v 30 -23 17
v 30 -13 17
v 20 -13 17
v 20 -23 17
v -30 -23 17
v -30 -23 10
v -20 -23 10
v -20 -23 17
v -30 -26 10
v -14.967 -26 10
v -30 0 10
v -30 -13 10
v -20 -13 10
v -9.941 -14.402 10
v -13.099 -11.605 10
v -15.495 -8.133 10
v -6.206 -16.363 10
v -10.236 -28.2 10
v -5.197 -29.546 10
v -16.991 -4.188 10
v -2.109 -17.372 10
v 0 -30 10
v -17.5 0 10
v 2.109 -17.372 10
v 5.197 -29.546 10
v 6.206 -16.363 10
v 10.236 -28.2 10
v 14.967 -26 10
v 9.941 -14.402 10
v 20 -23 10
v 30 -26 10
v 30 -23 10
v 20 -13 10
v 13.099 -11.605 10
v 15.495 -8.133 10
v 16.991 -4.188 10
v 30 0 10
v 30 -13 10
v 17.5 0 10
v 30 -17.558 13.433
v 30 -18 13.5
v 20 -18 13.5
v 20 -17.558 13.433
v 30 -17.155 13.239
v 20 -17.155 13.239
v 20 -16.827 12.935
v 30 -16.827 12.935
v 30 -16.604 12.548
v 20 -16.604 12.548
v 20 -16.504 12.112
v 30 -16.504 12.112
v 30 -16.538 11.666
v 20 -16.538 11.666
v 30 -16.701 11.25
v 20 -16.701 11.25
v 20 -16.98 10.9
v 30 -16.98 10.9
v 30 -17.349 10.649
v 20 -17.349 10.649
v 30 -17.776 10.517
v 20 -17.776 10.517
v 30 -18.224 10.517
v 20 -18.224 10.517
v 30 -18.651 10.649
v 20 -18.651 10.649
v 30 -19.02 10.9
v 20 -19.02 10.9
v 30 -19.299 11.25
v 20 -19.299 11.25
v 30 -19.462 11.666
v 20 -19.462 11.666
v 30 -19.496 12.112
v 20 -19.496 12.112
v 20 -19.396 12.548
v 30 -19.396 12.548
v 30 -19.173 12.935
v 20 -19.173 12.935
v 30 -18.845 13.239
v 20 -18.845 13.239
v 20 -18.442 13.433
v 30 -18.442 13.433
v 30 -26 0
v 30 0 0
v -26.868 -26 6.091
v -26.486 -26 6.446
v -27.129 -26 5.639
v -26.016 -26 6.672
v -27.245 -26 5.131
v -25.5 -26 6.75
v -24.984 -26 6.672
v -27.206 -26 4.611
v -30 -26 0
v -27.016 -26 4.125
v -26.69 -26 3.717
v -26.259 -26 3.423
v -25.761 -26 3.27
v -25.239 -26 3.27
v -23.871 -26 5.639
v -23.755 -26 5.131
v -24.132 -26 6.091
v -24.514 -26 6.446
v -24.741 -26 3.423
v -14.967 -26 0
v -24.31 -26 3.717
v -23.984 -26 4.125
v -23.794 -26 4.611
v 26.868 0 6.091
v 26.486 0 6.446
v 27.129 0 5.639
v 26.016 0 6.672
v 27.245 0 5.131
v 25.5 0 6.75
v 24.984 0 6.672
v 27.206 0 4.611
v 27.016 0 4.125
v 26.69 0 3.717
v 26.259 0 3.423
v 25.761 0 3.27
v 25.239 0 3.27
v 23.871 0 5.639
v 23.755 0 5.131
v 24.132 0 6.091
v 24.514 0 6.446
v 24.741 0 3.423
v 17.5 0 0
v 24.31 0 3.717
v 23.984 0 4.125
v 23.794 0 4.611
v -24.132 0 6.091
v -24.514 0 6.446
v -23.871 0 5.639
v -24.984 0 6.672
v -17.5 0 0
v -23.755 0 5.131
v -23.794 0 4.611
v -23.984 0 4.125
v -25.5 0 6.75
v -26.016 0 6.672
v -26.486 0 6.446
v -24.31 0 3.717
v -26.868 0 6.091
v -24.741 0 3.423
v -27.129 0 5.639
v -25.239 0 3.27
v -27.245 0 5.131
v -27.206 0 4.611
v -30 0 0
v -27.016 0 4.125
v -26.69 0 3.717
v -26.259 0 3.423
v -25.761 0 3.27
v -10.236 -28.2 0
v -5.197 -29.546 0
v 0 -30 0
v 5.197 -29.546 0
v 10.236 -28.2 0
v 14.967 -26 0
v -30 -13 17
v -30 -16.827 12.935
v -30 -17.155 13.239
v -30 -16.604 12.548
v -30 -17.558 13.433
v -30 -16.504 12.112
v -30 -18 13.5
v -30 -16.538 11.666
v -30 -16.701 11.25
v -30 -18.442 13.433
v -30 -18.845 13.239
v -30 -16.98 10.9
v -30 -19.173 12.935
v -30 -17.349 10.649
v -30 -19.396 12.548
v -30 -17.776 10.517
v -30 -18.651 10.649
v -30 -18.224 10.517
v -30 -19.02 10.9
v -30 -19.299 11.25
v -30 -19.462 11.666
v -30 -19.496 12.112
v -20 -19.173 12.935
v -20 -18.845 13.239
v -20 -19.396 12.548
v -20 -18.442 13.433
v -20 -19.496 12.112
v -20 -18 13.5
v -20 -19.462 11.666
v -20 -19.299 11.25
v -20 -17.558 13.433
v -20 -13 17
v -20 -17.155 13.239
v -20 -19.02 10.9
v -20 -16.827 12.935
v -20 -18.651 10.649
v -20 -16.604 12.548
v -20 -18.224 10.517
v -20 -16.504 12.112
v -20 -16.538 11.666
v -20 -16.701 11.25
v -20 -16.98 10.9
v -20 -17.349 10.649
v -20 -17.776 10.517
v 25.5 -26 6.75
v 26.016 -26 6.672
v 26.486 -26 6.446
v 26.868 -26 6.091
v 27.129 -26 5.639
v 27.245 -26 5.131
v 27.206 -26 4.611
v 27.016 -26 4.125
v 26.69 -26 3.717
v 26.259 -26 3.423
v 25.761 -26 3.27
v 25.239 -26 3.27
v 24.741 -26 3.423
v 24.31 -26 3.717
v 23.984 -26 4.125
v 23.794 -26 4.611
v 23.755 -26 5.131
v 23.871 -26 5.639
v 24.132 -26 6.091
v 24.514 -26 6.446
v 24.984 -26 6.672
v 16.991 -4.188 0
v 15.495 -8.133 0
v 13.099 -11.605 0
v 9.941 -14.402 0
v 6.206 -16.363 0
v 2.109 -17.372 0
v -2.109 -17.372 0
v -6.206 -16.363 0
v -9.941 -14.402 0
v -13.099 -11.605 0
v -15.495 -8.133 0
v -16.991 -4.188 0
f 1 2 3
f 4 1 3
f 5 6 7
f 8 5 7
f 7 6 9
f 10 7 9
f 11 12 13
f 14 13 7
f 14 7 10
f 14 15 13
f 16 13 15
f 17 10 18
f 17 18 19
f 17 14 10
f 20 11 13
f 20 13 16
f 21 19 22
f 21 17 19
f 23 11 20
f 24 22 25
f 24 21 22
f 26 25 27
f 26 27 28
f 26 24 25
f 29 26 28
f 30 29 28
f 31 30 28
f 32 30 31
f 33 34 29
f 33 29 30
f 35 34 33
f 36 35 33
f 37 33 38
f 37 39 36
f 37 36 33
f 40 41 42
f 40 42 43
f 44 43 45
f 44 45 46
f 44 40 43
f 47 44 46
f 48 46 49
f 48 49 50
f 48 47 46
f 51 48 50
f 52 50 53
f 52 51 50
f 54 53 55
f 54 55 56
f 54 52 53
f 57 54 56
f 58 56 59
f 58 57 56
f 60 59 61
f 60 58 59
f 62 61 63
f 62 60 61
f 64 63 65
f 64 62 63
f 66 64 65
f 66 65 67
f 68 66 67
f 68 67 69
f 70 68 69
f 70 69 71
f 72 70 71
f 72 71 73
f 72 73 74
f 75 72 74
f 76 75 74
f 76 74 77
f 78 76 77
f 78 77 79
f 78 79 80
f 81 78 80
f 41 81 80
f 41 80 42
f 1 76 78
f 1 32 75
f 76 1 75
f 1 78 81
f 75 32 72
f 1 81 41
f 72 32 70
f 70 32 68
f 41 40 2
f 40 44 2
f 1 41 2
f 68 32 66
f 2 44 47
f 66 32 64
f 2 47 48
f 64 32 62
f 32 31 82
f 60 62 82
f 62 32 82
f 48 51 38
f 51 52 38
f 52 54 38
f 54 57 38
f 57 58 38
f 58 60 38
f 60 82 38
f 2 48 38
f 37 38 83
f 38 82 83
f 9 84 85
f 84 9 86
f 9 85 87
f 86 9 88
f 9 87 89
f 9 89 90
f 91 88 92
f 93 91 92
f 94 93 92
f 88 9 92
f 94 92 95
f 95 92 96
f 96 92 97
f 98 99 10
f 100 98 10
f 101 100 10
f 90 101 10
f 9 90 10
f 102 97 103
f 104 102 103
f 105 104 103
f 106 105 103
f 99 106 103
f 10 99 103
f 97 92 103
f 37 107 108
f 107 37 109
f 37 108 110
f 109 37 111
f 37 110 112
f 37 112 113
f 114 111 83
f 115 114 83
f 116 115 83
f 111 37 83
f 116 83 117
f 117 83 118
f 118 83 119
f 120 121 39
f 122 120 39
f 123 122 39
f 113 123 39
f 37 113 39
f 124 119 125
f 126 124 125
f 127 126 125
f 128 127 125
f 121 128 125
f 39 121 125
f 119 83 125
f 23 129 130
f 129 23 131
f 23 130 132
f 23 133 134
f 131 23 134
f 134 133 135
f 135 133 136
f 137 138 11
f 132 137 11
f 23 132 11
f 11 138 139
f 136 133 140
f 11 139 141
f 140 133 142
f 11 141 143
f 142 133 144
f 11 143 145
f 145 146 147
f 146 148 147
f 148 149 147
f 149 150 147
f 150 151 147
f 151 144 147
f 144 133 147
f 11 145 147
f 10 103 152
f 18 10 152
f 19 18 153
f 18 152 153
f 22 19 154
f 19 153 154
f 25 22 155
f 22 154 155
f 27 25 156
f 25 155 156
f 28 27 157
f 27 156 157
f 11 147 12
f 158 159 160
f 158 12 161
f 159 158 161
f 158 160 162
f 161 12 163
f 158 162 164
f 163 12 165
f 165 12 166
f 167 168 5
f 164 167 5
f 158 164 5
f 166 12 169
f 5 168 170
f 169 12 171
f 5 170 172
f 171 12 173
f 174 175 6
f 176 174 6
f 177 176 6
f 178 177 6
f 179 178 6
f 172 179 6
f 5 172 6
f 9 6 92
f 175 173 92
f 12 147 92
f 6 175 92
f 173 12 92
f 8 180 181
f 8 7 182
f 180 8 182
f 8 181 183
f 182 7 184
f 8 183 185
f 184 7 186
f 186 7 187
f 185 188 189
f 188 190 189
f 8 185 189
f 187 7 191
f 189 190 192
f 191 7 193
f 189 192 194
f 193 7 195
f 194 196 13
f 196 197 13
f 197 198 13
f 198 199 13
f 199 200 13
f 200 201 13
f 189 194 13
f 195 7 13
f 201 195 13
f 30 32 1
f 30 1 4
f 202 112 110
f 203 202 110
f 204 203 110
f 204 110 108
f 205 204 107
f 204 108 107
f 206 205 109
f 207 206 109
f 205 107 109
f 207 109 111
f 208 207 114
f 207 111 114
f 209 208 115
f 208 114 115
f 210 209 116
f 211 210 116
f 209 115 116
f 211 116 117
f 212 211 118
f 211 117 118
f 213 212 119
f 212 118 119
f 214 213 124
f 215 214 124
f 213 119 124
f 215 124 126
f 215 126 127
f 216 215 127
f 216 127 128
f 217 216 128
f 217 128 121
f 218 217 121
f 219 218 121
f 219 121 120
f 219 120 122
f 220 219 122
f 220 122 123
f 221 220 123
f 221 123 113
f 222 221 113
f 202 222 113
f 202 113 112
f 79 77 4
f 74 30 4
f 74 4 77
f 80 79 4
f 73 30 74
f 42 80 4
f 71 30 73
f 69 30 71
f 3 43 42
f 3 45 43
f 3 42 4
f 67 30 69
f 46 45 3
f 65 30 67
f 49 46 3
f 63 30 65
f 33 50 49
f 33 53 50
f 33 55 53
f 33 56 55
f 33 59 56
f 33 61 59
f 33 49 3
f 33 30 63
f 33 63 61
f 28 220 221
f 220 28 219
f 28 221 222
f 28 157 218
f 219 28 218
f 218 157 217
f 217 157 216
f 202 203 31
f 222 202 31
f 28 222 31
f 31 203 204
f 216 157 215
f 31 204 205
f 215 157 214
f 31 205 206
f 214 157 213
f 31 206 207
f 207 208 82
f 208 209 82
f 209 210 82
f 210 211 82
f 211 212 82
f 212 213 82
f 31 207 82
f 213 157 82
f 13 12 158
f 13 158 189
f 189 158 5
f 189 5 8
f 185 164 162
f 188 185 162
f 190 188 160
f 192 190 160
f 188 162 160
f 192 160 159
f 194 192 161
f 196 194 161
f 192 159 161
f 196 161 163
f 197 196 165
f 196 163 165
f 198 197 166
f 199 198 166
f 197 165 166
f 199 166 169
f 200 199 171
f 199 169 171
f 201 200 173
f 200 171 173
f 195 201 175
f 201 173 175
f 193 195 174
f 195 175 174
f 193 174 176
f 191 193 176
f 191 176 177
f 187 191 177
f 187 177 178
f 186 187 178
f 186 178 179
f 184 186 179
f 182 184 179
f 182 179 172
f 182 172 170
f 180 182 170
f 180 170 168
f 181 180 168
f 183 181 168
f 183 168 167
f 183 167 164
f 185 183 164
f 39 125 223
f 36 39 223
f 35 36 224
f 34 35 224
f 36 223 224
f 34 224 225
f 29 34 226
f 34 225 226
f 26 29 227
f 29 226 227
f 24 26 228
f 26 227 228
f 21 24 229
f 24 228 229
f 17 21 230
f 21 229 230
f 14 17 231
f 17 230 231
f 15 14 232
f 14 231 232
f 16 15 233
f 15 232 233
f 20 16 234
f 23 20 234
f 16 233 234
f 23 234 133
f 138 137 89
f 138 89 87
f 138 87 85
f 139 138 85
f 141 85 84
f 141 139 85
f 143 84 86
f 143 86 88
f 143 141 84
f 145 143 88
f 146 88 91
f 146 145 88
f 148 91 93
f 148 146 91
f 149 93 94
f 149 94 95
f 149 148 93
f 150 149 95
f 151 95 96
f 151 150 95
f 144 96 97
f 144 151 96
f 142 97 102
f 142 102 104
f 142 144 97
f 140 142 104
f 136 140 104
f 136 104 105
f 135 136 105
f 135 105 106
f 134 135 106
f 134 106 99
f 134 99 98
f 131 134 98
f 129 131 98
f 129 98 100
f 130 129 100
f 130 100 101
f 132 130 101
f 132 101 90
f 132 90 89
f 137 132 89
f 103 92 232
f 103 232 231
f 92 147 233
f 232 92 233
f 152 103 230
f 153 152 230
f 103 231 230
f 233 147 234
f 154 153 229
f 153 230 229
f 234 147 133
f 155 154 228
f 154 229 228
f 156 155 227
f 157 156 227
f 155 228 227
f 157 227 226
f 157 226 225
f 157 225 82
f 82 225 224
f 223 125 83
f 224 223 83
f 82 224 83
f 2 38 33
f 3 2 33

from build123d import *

# Parameters (mm, degrees)
Y_KSEKLIK_EKSTR_ZYON1_DEPTH = 10
KES_EKSTR_ZYON3_REACH       = 45.589
IZIM7_R                     = 1.75
SKETCH1_W                   = 10
SKETCH1_H                   = 10
BOSS_EXTRUDE1_DEPTH         = 7
CUT_EXTRUDE1_REACH          = 71.203
SKETCH2_R                   = 1.5


with BuildPart() as part:
    # Çizim2 → Yükseklik-Ekstrüzyon1 (new body)
    with BuildSketch(Plane.XY):
        with BuildLine():
            Line((14.966629547, -26), (30, -26))
            Line((30, -26), (30, 0))
            Line((30, 0), (17.5, 0))
            ThreePointArc((17.5, 0), (0, -17.5), (-17.5, 0))
            Line((-17.5, 0), (-30, 0))
            Line((-30, 0), (-30, -26))
            Line((-30, -26), (-14.966629547, -26))
            ThreePointArc((-14.966629547, -26), (0, -30), (14.966629547, -26))
        make_face()
    extrude(amount=Y_KSEKLIK_EKSTR_ZYON1_DEPTH)

    # Çizim7 → Kes-Ekstrüzyon3 (cut, up to next)
    with BuildSketch(Plane(origin=(0, 0, 0), x_dir=(1, 0, 0), z_dir=(0, 1, 0)), mode=Mode.PRIVATE) as kes_ekstr_zyon3_sk1:
        with Locations(Location((25.5, -5, 0), (0, 0, 270))):
            Circle(IZIM7_R)
    kes_ekstr_zyon3_tool1 = extrude(kes_ekstr_zyon3_sk1.sketch, amount=-KES_EKSTR_ZYON3_REACH, mode=Mode.PRIVATE) & part.part
    kes_ekstr_zyon3 = kes_ekstr_zyon3_tool1.solids().sort_by_distance((25.5, 0, 5))[0]
    add(kes_ekstr_zyon3, mode=Mode.SUBTRACT)

    # Aynalama1: Kes-Ekstrüzyon3 across plane
    add(kes_ekstr_zyon3.mirror(Plane.ZY), mode=Mode.SUBTRACT)

    # Sketch1 → Boss-Extrude1 (add)
    with BuildSketch(Plane.XY.offset(10)):
        with Locations((-25, -18)):
            Rectangle(SKETCH1_W, SKETCH1_H)
    boss_extrude1 = extrude(amount=BOSS_EXTRUDE1_DEPTH)

    # Sketch2 → Cut-Extrude1 (cut, up to next)
    with BuildSketch(Plane.ZY.offset(30), mode=Mode.PRIVATE) as cut_extrude1_sk1:
        with Locations((12, -18)):
            Circle(SKETCH2_R)
    cut_extrude1_tool1 = extrude(cut_extrude1_sk1.sketch, amount=-CUT_EXTRUDE1_REACH, mode=Mode.PRIVATE) & part.part
    cut_extrude1 = cut_extrude1_tool1.solids().sort_by_distance((-30, -18, 12))[0]
    add(cut_extrude1, mode=Mode.SUBTRACT)

    # Mirror1: Boss-Extrude1, Cut-Extrude1 across plane
    add(boss_extrude1.mirror(Plane(origin=(0, 0, 0), x_dir=(0, 0, 1), z_dir=(1, 0, 0))))
    add(cut_extrude1.mirror(Plane(origin=(0, 0, 0), x_dir=(0, 0, 1), z_dir=(1, 0, 0))), mode=Mode.SUBTRACT)


solid = part.part
